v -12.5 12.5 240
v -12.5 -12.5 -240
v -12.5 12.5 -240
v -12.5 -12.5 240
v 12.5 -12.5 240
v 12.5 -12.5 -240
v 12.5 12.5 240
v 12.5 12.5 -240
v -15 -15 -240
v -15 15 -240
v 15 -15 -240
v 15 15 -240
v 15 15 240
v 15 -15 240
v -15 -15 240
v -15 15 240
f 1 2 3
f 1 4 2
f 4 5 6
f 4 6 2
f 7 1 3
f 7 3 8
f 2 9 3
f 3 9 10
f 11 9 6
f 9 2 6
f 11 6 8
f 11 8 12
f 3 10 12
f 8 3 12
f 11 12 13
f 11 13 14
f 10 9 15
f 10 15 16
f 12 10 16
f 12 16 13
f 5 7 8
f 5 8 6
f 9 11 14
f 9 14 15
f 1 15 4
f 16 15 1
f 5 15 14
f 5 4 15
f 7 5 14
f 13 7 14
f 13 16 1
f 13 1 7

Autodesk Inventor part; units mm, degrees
ref_plane "YZ Plane" through (0, 0, 0) normal (1, 0, 0) x (0, 1, 0)
ref_plane "XZ Plane" through (0, 0, 0) normal (0, 1, 0) x (-1, 0, 0)
ref_plane "XY Plane" through (0, 0, 0) normal (0, 0, 1) x (1, 0, 0)
sketch "Boceto1" plane through (0, 0, 0) normal (0, 0, 1) x (1, 0, 0)
  line L0 (-15, 15) -> (15, 15)
  line L1 (15, 15) -> (15, -15)
  line L2 (15, -15) -> (-15, -15)
  line L3 (-15, -15) -> (-15, 15)
  line L4 (-15, 15) -> (15, -15) construction
  line L5 (15, 15) -> (-15, -15) construction
  line L6 (-12.5, 12.5) -> (12.5, 12.5)
  line L7 (12.5, 12.5) -> (12.5, -12.5)
  line L8 (12.5, -12.5) -> (-12.5, -12.5)
  line L9 (-12.5, -12.5) -> (-12.5, 12.5)
  line L10 (-12.5, 12.5) -> (12.5, -12.5) construction
  line L11 (12.5, 12.5) -> (-12.5, -12.5) construction
  point P0 (0, 0)
  dimension "d2" = 30
  dimension "d3" = 30
  dimension "d4" = 25
  dimension "d5" = 25
extrude "Extrusión1" add sketch "Boceto1" against normal mid plane 480
properties part number "Barra_480" material "Acero"
